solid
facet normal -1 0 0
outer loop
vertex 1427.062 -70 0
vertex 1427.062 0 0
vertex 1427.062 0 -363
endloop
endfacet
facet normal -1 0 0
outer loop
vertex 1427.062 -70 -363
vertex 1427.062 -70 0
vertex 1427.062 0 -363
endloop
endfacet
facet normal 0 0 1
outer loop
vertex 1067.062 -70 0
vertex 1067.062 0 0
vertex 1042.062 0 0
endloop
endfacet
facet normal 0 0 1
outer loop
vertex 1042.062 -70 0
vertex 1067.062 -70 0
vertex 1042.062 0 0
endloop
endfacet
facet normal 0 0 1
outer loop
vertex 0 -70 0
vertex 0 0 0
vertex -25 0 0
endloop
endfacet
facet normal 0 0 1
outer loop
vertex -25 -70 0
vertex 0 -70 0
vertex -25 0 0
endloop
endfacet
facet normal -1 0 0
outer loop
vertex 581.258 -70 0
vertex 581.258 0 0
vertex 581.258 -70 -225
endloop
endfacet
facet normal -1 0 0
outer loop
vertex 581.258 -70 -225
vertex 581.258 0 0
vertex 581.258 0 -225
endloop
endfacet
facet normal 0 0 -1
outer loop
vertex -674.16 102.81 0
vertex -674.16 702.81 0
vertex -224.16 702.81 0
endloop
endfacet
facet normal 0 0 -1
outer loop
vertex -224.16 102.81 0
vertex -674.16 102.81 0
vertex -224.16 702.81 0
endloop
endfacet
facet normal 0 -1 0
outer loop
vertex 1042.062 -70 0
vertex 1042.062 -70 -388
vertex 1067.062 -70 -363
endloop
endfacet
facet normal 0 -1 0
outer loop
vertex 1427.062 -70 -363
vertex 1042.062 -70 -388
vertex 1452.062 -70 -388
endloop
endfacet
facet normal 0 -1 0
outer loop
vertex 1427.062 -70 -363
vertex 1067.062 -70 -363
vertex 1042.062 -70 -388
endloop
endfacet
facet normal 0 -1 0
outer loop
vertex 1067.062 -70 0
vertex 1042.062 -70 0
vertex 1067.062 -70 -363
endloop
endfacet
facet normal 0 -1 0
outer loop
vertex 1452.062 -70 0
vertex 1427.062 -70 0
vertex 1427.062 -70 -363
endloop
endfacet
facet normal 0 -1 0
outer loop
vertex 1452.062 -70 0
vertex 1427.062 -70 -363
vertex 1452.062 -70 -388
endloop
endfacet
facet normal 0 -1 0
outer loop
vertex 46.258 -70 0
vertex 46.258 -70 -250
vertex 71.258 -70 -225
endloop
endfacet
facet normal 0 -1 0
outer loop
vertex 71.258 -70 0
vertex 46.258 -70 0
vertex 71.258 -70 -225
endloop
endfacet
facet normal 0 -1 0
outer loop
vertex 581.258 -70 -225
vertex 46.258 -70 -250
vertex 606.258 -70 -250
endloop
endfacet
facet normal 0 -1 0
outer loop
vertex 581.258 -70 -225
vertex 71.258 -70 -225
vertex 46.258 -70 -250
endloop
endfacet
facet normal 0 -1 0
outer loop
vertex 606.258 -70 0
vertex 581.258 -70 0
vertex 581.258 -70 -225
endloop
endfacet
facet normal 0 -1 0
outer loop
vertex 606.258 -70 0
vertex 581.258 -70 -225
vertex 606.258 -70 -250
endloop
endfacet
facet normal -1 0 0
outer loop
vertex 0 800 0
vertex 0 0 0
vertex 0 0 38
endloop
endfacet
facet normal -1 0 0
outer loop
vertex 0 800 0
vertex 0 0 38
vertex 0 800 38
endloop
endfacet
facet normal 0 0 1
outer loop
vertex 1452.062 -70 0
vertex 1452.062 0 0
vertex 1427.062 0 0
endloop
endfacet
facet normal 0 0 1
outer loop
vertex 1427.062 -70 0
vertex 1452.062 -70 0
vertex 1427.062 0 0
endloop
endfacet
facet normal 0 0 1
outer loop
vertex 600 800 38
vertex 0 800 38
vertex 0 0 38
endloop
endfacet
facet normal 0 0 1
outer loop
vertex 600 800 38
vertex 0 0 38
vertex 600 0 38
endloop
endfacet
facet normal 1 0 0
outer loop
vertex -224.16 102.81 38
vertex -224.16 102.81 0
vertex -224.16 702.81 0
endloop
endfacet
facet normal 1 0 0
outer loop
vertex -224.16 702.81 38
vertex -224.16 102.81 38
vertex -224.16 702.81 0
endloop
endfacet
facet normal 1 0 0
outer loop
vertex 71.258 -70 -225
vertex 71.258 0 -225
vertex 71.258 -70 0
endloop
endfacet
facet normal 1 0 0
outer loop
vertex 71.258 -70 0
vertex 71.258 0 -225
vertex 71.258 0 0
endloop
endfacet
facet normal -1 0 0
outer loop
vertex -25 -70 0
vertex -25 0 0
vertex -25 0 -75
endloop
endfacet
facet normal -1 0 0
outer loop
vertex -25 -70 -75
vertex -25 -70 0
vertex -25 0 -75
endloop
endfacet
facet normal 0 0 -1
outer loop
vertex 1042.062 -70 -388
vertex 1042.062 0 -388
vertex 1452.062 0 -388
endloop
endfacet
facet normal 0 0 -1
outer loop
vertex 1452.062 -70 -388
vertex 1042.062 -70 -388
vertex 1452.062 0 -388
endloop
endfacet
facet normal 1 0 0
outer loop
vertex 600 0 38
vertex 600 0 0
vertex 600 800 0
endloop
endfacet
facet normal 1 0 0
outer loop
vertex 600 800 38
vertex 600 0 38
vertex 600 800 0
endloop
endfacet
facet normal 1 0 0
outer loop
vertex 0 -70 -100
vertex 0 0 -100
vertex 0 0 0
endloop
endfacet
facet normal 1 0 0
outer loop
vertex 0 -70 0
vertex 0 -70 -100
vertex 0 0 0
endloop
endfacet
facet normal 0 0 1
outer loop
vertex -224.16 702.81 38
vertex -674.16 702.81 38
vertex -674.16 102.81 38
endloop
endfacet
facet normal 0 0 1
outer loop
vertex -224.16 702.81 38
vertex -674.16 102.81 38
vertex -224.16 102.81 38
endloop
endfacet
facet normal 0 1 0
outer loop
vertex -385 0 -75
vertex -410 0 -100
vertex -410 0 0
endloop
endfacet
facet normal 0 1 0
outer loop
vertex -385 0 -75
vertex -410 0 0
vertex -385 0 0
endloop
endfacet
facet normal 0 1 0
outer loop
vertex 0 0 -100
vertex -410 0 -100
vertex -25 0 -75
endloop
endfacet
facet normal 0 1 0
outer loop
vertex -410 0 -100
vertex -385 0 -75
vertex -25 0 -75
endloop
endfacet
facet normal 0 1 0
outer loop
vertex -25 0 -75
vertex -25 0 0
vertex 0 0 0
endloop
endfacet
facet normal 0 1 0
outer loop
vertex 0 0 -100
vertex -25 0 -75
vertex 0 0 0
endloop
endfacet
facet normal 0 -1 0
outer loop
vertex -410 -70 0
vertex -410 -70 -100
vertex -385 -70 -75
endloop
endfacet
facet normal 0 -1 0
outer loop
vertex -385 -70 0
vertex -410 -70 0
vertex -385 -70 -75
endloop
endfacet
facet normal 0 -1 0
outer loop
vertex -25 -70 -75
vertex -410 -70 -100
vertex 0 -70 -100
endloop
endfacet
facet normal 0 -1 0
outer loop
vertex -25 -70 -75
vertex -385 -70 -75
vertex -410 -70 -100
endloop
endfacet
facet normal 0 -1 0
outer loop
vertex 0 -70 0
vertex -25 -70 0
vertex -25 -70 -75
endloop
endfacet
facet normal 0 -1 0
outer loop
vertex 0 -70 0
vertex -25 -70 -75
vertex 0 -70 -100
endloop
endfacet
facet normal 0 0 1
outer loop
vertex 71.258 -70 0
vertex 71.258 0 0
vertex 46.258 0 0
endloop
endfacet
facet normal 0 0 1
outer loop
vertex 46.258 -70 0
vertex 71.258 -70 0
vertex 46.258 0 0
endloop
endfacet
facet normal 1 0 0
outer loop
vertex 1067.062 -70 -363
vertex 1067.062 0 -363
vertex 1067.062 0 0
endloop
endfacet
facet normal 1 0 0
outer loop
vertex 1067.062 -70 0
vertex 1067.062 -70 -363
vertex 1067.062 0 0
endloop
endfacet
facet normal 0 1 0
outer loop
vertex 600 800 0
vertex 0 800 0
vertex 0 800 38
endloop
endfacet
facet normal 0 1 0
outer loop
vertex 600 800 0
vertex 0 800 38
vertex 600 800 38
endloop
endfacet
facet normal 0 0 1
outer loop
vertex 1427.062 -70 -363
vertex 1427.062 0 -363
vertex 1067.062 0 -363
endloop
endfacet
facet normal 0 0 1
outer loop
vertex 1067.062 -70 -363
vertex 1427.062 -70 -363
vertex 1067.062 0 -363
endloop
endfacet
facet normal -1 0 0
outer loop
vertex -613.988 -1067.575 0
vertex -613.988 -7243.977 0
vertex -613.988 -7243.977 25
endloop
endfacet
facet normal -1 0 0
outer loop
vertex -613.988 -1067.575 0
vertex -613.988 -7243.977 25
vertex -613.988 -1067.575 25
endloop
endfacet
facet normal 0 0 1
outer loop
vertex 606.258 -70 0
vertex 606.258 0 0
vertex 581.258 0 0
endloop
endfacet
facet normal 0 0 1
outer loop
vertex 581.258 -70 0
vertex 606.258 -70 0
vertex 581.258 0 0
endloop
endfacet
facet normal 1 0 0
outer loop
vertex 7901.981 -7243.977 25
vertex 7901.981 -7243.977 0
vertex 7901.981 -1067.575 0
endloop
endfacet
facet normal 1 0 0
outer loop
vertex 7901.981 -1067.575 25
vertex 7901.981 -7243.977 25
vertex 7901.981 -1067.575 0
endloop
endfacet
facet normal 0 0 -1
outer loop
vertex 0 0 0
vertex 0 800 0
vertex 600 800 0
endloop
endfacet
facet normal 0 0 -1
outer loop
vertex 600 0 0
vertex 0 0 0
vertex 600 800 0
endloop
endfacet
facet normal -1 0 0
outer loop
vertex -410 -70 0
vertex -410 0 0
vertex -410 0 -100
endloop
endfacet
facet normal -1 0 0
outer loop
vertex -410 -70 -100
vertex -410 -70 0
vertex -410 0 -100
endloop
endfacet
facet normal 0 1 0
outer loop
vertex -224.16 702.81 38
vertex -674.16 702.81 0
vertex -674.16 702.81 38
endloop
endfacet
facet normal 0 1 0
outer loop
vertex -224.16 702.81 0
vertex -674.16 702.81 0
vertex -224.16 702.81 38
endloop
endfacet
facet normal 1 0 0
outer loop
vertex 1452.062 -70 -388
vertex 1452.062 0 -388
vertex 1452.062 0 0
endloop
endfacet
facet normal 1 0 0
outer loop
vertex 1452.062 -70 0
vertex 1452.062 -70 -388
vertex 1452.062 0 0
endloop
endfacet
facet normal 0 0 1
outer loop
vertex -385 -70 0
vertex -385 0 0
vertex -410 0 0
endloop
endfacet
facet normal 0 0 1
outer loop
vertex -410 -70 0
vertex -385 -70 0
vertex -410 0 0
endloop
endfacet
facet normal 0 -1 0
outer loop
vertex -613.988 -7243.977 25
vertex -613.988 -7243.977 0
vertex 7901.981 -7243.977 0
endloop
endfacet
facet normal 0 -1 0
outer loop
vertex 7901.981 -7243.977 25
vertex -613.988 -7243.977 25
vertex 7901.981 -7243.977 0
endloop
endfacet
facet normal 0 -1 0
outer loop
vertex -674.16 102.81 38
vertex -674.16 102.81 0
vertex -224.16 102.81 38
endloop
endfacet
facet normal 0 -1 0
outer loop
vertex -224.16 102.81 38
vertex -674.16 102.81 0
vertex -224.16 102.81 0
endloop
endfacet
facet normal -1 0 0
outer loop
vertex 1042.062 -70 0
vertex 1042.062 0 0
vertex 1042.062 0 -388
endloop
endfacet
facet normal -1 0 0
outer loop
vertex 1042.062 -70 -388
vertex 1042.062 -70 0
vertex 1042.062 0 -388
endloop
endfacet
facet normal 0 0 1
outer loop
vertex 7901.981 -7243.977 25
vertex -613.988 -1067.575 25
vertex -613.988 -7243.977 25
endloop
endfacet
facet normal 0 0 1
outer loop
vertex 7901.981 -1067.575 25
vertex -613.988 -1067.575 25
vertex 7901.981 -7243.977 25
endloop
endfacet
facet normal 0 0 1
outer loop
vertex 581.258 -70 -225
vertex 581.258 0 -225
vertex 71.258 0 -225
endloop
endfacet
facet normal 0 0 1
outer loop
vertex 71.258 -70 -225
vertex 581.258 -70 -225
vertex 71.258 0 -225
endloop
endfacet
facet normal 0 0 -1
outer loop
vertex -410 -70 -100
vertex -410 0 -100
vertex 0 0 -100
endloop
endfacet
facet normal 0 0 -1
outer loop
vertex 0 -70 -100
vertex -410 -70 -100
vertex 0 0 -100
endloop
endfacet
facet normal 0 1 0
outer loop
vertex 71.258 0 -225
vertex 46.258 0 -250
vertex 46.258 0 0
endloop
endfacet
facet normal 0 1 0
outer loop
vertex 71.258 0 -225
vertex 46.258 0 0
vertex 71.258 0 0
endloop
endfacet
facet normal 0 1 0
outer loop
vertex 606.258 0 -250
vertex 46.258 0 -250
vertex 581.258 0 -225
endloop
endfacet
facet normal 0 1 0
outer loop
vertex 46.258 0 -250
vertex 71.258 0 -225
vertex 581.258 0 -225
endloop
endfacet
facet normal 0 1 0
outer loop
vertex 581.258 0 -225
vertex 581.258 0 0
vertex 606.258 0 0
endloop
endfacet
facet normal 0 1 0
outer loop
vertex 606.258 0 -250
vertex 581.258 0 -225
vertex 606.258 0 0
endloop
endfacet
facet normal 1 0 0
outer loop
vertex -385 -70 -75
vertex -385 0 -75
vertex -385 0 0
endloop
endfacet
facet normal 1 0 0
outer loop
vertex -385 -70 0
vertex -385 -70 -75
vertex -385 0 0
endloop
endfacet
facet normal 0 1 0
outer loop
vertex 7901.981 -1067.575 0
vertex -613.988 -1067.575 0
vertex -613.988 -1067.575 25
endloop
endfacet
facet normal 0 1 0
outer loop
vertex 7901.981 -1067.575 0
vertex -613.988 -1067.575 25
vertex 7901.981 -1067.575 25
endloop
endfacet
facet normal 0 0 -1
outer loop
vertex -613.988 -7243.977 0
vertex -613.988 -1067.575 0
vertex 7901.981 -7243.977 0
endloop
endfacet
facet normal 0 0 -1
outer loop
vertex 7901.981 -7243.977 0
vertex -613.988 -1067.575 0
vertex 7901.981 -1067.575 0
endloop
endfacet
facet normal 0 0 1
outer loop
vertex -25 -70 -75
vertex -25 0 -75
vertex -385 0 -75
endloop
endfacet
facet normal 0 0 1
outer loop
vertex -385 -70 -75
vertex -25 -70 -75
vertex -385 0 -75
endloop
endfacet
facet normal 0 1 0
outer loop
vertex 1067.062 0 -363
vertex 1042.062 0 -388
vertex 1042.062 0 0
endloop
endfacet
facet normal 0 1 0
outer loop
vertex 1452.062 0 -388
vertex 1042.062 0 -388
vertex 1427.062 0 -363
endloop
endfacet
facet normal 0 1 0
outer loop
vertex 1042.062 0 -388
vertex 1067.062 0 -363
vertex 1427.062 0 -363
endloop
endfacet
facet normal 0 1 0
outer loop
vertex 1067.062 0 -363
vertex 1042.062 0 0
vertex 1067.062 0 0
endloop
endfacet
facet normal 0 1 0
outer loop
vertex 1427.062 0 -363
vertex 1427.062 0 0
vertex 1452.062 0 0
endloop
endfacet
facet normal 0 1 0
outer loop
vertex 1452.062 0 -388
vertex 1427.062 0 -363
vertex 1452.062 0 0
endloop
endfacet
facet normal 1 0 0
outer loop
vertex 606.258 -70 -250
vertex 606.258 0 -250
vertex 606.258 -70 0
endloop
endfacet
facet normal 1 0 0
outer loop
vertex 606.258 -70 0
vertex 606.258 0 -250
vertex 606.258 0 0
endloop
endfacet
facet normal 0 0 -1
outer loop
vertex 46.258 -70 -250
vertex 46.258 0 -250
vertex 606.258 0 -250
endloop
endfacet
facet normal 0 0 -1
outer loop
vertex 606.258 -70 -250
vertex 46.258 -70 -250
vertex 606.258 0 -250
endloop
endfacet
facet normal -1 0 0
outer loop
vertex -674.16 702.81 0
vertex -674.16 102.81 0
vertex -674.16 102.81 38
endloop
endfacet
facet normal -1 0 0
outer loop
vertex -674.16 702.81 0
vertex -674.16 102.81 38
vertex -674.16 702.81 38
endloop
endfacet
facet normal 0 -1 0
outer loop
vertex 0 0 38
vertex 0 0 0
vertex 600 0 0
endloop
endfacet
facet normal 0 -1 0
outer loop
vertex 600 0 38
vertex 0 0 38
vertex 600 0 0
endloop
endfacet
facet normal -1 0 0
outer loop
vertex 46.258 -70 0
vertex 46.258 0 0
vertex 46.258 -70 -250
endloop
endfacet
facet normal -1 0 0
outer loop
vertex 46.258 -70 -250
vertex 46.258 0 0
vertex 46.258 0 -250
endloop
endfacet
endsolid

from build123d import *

# Parameters (mm, degrees)
F0_W      = 600
F0_H      = 800
F1_DEPTH  = 38
F3_DEPTH  = 70
F5_DEPTH  = 70
F9_DEPTH  = 70
F10_W     = 450
F10_H     = 600
F11_DEPTH = 38
F12_W     = 8515.9688591957
F12_H     = 6176.4018535614
F13_DEPTH = 25


# Not quite as in the source:
# - a feature of the source that left no trace in its solid (it failed there, or was rolled back) is left out


with BuildPart() as f1:
    # F0 (on Top) → F1 (new body)
    with BuildSketch(Plane.XY):
        with Locations((300, 400)):
            Rectangle(F0_W, F0_H)
    extrude(amount=F1_DEPTH)


with BuildPart() as f3:
    # F2 (on Front) → F3 (new body)
    with BuildSketch(Plane.XZ):
        Polygon((71.2579559533, 0), (46.2579559533, 0), (46.2579559533, -250), (606.2579559533, -250), (606.2579559533, 0), (581.2579559533, 0), (581.2579559533, -225), (71.2579559533, -225), align=None)
    extrude(amount=F3_DEPTH)


with BuildPart() as f5:
    # F4 (on Front) → F5 (new body)
    with BuildSketch(Plane.XZ):
        Polygon((0, -100), (0, 0), (-25, 0), (-25, -75), (-385, -75), (-385, 0), (-410, 0), (-410, -100), align=None)
    extrude(amount=F5_DEPTH)


with BuildPart() as f9:
    # F8 (on Front) → F9 (new body)
    with BuildSketch(Plane.XZ):
        Polygon((1067.0620972831, 0), (1042.0620972831, 0), (1042.0620972831, -388), (1452.0620972831, -388), (1452.0620972831, 0), (1427.0620972831, 0), (1427.0620972831, -363), (1067.0620972831, -363), align=None)
    extrude(amount=F9_DEPTH)


with BuildPart() as f11:
    # F10 (on Top) → F11 (new body)
    with BuildSketch(Plane.XY):
        with Locations((-449.1596068184, 402.8104767203)):
            Rectangle(F10_W, F10_H)
    extrude(amount=F11_DEPTH)


with BuildPart() as f13:
    # F12 (on Top) → F13 (new body)
    with BuildSketch(Plane.XY):
        with Locations((3643.9969241619, -4155.7756662369)):
            Rectangle(F12_W, F12_H)
    extrude(amount=F13_DEPTH)


solid = Compound([f1.part, f3.part, f5.part, f9.part, f11.part, f13.part])
